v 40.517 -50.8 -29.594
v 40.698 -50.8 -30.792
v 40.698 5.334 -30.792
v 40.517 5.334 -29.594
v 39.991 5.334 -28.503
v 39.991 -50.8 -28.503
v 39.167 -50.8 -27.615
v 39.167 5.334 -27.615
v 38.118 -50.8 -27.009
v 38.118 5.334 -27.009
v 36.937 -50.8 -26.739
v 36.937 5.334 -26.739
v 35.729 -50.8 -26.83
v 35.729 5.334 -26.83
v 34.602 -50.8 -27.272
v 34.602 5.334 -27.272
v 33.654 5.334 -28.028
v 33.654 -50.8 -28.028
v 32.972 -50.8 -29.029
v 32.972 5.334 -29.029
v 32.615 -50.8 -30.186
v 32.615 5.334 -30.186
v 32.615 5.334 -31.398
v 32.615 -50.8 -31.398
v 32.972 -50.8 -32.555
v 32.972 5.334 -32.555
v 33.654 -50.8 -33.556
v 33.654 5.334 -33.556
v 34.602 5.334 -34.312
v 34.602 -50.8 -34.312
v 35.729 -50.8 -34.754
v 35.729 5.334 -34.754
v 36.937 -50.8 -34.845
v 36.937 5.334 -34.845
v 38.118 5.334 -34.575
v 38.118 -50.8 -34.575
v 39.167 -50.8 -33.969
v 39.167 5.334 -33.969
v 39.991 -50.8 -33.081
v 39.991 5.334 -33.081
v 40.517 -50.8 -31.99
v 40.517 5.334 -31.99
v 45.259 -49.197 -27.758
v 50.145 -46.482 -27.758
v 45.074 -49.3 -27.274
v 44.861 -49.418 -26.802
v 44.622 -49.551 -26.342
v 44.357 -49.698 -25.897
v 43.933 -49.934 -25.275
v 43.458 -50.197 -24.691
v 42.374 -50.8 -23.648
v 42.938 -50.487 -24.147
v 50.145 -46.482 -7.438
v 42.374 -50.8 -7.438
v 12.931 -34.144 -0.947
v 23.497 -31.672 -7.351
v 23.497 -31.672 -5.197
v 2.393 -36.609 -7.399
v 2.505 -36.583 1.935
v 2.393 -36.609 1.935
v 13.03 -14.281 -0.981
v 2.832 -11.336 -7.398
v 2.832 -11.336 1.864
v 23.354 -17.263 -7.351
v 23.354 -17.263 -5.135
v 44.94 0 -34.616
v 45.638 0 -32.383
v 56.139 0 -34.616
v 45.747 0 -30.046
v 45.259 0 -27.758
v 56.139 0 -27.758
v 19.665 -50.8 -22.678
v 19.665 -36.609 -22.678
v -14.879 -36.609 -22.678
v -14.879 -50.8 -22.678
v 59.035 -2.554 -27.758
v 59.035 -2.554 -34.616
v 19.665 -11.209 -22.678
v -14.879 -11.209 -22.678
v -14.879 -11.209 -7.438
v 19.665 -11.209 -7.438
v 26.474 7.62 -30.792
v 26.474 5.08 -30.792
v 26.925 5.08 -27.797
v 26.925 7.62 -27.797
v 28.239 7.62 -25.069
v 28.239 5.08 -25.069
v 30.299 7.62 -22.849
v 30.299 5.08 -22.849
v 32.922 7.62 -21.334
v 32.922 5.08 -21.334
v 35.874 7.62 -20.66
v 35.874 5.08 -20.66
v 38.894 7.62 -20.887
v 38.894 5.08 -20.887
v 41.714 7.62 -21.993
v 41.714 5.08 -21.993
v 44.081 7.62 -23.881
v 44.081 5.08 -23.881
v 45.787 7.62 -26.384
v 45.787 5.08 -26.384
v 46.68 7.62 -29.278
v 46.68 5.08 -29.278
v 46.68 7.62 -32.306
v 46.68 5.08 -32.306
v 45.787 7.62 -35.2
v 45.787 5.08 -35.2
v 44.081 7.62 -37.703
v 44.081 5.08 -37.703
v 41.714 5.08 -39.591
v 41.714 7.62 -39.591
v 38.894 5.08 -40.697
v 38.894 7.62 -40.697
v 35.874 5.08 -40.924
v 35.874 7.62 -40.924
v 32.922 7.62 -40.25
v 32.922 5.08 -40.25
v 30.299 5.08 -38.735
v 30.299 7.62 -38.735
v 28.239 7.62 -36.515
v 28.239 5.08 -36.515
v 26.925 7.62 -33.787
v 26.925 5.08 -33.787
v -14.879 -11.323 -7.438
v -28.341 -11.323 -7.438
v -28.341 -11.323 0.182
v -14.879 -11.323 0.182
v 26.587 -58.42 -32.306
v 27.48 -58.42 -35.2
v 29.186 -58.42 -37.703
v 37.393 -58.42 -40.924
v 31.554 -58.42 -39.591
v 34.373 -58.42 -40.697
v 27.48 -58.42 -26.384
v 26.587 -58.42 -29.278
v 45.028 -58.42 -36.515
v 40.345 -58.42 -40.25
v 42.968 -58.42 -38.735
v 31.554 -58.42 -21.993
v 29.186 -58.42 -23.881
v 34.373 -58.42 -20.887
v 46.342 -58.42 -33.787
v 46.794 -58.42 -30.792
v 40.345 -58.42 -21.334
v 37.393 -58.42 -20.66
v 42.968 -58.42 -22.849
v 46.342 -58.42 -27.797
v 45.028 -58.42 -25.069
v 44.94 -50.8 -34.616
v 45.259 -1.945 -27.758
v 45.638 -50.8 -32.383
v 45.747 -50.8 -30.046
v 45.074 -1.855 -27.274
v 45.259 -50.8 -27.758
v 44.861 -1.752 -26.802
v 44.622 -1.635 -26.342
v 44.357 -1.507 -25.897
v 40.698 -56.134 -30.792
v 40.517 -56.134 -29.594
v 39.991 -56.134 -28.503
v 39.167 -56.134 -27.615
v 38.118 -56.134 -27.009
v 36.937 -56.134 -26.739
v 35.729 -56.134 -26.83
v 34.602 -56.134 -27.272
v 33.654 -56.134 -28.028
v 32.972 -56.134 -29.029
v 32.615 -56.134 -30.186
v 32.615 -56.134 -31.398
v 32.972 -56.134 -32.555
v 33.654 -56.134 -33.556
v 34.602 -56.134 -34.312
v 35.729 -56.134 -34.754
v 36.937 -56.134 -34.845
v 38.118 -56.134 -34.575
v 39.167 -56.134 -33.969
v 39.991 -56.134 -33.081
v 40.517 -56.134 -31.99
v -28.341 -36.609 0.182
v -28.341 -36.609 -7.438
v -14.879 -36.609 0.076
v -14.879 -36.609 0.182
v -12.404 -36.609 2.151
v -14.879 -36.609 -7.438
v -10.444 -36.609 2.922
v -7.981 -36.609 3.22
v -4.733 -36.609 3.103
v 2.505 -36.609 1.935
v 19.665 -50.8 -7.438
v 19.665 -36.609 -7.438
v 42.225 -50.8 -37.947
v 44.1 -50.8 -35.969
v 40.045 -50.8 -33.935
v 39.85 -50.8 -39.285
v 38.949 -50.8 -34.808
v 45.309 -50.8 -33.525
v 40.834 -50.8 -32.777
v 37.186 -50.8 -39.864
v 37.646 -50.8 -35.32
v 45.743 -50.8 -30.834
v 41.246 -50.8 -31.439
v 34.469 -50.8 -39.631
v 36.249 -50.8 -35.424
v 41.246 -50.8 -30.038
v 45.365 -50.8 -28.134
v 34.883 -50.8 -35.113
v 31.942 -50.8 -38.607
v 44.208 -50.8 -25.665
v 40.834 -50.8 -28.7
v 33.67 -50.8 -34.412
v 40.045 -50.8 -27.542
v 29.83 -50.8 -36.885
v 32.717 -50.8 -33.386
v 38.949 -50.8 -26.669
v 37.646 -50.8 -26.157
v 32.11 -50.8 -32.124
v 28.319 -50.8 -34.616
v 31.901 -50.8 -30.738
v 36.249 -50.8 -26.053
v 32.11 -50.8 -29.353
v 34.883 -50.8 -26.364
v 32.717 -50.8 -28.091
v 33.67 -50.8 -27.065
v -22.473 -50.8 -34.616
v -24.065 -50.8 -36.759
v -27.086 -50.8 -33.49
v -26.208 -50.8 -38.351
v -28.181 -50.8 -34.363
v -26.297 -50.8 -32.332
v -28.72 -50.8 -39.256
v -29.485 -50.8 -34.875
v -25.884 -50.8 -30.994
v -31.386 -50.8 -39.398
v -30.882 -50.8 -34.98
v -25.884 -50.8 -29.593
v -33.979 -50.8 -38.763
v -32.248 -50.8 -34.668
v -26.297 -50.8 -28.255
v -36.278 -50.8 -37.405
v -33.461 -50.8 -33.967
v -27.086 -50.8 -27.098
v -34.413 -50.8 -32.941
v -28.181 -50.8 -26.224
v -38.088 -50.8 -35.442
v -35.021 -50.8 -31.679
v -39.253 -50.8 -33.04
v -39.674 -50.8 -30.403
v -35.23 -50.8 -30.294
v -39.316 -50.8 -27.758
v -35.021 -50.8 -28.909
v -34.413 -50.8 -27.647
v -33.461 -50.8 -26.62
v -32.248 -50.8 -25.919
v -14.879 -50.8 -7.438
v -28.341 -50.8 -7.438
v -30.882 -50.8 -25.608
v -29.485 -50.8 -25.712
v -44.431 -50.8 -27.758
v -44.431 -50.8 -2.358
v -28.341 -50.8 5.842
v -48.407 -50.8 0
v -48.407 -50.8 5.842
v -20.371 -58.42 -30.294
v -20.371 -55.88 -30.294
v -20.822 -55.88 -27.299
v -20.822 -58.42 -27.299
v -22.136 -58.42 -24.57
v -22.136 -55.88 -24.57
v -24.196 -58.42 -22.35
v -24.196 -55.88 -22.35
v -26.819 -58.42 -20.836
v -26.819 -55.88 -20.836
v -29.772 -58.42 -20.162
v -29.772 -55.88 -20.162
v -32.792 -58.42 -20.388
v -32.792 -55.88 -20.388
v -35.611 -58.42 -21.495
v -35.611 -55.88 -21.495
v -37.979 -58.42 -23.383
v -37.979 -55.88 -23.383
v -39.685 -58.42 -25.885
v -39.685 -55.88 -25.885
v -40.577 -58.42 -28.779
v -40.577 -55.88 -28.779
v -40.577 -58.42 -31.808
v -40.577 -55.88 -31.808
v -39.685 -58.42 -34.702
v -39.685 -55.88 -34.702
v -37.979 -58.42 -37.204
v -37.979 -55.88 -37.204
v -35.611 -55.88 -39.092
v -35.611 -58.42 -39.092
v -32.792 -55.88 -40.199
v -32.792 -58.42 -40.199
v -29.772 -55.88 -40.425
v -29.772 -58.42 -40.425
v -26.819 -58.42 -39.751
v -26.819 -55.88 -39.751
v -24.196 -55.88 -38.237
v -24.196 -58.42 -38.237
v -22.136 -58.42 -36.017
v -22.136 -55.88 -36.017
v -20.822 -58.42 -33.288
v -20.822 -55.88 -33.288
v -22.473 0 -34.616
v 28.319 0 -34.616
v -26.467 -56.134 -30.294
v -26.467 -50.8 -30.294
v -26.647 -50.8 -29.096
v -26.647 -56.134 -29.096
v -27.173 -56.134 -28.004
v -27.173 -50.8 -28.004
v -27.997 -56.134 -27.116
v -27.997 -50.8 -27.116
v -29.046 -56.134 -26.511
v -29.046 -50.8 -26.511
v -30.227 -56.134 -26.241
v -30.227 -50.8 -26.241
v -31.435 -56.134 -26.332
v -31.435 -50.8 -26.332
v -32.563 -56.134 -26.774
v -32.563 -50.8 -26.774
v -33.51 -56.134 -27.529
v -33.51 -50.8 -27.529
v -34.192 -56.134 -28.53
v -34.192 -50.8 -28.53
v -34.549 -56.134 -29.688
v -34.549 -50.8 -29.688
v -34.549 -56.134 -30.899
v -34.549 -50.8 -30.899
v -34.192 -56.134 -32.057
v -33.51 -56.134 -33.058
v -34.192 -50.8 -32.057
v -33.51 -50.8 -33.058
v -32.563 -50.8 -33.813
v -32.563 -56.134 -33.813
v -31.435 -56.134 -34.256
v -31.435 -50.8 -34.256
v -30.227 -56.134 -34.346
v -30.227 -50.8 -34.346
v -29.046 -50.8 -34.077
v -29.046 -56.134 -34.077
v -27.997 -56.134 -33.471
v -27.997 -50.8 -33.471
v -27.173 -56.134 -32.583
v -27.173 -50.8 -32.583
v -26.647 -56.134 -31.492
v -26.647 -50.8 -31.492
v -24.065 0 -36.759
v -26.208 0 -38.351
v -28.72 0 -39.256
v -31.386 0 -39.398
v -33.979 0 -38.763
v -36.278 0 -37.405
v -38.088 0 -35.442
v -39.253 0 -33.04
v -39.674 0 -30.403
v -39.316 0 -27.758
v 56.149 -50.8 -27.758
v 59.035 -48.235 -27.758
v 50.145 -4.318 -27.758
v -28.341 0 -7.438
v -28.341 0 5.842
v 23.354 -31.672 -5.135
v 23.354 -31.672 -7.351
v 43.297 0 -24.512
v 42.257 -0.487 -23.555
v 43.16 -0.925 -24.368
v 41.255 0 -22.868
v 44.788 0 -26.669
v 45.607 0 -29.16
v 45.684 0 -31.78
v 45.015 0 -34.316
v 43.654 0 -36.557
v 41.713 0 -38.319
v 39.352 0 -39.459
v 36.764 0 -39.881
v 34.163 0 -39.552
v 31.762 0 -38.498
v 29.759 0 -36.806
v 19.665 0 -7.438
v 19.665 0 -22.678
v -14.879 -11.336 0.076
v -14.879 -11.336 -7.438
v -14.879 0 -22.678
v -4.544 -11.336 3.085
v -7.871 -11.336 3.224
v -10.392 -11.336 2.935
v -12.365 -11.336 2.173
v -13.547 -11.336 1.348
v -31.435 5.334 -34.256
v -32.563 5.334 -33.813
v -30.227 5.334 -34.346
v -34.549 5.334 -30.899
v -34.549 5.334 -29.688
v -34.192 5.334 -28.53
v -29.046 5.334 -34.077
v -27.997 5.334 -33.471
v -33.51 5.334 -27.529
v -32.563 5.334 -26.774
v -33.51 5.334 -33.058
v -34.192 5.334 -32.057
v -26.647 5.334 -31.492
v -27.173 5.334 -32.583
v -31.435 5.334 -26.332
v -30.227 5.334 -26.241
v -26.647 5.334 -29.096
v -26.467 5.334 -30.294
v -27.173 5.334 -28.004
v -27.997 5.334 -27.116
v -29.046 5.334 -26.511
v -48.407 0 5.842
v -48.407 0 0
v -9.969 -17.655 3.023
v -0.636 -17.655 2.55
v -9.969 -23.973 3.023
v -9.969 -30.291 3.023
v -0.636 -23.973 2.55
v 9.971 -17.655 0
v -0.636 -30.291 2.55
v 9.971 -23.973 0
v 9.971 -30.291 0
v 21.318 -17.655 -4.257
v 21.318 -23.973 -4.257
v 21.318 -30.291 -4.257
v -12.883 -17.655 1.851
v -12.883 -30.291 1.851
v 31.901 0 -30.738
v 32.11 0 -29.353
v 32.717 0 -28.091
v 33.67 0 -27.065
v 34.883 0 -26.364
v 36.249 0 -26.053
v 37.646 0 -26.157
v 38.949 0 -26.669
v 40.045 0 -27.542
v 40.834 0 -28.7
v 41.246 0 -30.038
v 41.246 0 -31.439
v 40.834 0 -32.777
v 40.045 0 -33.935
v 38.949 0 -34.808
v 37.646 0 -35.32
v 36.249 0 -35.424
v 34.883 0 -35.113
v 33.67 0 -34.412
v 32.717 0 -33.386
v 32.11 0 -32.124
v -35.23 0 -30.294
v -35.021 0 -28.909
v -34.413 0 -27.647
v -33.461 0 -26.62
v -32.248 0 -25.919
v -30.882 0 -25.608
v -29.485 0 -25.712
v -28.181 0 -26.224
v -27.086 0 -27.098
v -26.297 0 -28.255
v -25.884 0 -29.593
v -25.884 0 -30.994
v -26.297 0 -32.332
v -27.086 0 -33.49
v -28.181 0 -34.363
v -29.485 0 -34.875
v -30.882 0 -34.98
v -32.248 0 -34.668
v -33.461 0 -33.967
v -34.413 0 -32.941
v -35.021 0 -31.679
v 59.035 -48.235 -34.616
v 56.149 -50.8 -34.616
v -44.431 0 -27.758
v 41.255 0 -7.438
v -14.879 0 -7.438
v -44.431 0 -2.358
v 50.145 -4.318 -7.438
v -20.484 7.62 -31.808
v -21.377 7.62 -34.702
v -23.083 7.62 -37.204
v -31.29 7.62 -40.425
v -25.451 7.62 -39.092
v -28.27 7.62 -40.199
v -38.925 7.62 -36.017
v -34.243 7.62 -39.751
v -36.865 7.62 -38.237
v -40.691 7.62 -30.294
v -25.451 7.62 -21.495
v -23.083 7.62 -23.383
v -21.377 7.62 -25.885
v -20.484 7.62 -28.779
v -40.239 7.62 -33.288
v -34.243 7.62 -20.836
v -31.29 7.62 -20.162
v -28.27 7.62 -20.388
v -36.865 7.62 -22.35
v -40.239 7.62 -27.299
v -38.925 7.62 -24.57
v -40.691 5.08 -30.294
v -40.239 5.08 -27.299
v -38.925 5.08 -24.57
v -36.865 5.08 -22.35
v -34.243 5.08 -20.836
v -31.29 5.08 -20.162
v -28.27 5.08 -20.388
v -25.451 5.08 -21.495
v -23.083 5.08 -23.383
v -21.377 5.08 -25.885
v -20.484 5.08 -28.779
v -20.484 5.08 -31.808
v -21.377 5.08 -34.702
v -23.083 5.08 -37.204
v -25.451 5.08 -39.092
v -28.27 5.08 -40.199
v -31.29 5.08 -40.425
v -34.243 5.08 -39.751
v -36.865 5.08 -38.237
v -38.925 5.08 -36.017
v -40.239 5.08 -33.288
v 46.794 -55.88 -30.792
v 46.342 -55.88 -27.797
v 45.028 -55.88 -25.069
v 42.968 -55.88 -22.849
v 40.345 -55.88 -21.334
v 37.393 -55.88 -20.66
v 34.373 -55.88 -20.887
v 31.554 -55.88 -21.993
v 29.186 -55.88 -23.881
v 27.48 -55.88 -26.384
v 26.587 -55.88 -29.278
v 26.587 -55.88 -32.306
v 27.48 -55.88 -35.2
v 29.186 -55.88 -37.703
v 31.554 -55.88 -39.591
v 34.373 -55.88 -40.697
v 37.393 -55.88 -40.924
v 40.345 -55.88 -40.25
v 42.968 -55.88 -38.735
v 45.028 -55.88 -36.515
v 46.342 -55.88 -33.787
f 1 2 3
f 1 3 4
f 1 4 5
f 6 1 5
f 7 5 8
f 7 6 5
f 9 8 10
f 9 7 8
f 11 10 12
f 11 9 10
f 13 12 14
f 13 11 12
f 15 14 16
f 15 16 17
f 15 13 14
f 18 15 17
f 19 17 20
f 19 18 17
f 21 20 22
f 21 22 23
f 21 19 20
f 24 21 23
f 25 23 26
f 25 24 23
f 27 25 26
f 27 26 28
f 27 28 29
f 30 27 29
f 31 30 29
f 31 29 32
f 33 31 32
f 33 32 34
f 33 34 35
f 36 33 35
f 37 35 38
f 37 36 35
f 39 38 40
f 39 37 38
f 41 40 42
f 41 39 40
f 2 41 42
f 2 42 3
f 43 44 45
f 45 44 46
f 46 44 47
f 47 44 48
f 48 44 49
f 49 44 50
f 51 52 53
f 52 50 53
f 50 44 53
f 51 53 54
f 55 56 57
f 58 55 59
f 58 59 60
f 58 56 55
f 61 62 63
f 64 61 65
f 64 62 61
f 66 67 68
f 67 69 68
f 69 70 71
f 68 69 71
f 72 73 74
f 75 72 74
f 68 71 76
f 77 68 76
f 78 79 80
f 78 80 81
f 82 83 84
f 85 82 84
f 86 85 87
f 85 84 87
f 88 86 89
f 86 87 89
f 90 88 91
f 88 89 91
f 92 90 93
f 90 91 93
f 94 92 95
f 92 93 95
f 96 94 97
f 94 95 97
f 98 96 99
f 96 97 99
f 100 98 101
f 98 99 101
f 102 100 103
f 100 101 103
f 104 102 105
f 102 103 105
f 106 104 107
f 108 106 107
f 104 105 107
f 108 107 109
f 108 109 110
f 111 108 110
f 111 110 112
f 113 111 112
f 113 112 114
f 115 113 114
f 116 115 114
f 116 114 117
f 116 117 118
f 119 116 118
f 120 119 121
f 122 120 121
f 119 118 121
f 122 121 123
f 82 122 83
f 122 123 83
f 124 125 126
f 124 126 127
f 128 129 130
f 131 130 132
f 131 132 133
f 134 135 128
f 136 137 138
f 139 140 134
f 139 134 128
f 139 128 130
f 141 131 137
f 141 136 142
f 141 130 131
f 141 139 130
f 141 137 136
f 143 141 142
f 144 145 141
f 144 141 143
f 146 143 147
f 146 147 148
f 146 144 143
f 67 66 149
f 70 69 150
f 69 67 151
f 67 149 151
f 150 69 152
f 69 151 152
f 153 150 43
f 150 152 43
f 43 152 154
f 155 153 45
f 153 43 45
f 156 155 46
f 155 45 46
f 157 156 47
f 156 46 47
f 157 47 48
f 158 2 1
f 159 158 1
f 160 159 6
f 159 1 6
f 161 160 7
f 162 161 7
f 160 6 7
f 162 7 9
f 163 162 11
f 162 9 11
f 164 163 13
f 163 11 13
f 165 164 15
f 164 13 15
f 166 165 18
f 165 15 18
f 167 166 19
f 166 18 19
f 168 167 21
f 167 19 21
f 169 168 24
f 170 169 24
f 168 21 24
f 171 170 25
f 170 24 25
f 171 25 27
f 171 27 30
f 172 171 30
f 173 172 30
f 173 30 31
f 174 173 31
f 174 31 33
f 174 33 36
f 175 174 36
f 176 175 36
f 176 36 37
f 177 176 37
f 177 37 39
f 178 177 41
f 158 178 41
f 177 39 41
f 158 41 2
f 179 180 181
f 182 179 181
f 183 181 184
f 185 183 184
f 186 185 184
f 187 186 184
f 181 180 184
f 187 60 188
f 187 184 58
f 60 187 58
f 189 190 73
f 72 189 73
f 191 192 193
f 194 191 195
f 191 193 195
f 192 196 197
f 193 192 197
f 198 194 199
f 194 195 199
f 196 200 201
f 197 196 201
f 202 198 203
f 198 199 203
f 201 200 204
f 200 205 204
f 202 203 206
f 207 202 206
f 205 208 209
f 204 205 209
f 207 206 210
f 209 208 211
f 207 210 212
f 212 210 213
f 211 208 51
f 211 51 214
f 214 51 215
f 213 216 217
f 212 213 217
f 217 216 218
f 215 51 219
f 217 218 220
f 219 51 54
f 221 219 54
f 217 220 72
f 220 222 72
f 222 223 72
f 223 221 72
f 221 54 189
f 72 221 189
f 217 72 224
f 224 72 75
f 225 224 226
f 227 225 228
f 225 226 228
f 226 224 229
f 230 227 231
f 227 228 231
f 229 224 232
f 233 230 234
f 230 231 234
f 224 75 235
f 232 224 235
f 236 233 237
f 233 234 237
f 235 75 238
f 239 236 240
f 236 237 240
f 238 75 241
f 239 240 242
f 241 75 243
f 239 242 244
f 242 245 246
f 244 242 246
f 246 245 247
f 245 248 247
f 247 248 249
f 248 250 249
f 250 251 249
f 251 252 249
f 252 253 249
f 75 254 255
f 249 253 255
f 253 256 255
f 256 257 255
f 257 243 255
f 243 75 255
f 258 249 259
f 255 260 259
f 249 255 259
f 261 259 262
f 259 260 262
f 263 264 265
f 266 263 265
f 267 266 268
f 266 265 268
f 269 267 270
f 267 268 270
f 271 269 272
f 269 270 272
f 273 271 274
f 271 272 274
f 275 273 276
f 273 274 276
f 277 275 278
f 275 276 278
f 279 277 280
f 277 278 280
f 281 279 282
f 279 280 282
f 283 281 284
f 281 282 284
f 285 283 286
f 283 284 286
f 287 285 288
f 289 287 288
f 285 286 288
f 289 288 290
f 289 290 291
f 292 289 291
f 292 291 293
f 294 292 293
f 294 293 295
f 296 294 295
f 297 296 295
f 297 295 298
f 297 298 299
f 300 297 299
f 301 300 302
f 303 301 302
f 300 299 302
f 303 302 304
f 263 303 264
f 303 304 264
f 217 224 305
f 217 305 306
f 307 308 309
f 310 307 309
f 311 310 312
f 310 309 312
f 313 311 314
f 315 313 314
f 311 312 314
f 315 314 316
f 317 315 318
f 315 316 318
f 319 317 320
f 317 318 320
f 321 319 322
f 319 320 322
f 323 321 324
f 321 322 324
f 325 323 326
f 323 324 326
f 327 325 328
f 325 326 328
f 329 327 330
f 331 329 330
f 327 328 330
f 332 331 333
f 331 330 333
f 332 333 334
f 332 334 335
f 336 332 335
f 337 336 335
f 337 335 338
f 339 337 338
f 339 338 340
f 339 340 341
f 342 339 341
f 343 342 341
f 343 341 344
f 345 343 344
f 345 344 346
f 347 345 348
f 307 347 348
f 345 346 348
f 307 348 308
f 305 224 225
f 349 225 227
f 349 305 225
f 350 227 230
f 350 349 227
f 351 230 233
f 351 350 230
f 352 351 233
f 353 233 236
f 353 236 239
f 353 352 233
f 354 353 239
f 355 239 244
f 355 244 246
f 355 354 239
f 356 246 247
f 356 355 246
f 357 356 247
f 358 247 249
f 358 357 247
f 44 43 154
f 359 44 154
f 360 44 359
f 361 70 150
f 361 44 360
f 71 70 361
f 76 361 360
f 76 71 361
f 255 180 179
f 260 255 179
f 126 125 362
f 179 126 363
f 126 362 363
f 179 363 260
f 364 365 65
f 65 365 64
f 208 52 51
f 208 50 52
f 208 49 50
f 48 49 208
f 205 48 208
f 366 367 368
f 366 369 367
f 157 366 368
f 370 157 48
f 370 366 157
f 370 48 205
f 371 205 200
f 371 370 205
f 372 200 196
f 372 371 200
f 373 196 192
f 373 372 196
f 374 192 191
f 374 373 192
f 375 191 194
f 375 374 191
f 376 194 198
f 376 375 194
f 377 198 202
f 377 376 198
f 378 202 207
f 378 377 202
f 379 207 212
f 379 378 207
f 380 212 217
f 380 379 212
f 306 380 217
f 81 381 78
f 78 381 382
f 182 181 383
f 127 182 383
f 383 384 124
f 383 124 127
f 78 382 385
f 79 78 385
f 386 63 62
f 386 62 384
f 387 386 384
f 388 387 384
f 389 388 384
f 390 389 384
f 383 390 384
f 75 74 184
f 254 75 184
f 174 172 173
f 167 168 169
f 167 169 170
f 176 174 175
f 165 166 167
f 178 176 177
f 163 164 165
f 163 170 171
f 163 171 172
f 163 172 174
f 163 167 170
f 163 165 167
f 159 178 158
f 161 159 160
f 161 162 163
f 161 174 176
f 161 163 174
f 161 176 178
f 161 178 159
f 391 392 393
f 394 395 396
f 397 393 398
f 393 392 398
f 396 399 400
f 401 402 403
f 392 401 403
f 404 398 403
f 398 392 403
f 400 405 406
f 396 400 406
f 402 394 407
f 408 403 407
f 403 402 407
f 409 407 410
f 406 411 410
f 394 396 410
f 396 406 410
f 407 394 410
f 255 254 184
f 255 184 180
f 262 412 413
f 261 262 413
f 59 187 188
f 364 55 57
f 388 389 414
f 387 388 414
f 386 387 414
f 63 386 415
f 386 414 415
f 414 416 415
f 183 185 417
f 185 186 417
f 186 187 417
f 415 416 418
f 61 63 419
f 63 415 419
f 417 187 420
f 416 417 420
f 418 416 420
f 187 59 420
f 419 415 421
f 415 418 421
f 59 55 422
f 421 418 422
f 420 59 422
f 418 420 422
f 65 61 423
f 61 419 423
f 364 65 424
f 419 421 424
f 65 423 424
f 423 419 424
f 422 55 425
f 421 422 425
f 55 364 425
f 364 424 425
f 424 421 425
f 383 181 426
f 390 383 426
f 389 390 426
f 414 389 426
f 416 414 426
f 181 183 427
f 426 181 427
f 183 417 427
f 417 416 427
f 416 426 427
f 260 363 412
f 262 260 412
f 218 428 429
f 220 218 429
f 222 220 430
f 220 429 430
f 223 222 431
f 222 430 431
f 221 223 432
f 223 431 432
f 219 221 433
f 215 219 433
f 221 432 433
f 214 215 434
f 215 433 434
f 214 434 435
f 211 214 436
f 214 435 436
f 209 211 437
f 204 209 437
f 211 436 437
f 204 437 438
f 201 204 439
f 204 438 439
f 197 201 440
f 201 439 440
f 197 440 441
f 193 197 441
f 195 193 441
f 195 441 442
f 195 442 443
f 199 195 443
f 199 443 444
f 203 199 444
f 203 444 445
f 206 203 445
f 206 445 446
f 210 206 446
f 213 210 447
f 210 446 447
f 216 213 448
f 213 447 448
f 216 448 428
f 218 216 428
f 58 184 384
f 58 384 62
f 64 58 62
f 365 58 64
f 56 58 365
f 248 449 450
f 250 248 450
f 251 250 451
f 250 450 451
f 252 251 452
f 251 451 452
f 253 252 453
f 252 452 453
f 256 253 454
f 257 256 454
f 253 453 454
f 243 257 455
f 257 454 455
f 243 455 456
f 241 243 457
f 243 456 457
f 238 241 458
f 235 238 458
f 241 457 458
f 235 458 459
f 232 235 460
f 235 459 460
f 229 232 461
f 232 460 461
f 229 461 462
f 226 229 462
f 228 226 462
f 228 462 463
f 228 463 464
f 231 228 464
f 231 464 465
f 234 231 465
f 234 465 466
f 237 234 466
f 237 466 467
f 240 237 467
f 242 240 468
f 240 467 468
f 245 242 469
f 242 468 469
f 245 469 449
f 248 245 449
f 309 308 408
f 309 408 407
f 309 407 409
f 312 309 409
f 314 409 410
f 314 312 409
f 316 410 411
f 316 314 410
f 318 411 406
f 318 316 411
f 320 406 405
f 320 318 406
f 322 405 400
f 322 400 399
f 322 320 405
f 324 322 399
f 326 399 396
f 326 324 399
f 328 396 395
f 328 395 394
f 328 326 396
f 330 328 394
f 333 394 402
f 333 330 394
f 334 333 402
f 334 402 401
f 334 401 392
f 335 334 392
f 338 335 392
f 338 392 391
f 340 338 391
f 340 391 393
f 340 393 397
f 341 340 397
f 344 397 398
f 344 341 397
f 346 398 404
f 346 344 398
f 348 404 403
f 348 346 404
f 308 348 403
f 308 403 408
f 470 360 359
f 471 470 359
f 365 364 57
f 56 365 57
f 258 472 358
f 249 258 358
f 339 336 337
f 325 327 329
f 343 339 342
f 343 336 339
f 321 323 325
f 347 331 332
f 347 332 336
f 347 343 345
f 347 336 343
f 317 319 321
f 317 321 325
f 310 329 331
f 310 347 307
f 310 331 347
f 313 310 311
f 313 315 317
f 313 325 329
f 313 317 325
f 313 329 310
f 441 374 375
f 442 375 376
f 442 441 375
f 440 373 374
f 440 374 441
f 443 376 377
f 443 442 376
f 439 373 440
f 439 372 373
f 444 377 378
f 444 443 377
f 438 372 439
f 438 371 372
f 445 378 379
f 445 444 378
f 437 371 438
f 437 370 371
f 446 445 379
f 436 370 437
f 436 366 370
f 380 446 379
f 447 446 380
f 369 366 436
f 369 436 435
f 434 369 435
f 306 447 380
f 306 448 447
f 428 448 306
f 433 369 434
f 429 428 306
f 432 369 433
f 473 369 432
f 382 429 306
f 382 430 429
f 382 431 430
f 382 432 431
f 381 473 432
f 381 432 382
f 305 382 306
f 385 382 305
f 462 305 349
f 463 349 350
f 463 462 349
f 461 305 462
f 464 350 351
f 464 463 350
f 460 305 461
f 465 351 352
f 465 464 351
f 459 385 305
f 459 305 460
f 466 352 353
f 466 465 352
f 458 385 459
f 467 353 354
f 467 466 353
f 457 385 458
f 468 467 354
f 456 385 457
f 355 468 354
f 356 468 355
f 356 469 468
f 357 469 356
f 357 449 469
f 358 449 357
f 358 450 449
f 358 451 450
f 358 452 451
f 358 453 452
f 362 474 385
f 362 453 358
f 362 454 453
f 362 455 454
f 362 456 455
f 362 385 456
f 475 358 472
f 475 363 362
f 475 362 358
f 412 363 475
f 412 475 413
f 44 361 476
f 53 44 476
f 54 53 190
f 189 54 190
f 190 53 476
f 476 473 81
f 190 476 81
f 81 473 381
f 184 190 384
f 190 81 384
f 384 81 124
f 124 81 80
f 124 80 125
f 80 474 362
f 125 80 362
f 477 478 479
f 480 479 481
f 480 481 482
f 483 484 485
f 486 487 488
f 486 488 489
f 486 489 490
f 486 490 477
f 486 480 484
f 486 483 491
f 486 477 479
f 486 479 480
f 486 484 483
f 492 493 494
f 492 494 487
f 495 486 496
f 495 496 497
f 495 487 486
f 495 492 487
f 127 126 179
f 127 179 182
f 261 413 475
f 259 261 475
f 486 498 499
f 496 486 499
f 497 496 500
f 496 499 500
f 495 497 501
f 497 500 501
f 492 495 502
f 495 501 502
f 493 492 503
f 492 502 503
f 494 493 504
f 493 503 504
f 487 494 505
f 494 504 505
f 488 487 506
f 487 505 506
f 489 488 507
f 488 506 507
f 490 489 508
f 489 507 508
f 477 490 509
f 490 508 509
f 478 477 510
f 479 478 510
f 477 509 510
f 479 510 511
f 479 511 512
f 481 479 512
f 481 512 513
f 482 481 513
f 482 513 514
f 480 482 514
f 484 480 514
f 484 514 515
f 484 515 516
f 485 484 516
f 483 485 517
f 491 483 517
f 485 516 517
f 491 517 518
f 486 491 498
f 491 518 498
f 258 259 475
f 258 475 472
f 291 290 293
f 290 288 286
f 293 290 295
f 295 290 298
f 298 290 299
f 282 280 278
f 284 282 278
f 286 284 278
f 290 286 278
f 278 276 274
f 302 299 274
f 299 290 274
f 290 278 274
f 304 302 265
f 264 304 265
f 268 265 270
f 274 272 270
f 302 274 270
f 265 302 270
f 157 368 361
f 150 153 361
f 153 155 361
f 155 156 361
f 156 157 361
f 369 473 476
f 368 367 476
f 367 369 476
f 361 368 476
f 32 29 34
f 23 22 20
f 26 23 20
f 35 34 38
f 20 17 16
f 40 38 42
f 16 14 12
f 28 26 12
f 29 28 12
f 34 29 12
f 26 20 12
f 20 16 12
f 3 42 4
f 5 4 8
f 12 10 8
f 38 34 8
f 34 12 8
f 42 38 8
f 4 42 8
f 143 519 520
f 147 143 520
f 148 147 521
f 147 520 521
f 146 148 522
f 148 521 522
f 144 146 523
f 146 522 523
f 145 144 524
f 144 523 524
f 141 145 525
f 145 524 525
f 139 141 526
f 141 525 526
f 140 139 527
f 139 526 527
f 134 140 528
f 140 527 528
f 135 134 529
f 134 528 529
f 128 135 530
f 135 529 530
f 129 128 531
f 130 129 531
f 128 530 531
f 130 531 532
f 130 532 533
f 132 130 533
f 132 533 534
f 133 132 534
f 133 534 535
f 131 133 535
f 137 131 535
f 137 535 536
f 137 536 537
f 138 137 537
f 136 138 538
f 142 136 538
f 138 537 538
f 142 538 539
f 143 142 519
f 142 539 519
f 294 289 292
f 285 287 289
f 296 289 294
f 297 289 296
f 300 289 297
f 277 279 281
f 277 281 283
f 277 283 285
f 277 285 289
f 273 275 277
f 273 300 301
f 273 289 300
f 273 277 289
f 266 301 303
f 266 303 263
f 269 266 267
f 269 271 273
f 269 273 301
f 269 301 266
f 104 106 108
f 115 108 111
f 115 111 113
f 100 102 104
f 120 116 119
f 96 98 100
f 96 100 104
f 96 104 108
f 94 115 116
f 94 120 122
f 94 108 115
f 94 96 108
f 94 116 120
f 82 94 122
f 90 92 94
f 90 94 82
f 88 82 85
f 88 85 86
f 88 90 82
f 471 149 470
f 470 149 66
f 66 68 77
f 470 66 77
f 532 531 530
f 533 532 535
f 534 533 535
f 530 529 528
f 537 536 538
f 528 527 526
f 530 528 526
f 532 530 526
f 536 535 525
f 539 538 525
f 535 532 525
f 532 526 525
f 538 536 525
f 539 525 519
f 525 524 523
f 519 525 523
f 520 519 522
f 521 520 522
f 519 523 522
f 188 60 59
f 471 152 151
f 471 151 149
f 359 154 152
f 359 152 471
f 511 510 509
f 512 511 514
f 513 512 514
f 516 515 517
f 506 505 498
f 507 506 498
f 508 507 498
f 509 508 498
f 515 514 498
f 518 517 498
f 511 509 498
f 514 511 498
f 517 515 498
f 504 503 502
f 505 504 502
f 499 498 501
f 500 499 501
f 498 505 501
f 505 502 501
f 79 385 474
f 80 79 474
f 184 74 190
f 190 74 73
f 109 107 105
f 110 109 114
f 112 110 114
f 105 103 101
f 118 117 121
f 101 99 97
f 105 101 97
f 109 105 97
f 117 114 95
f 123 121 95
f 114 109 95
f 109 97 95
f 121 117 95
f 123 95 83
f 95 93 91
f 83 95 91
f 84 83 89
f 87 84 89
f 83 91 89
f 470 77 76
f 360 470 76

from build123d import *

# Parameters (mm, degrees)
F1_DEPTH      = 50.8
F2_R          = 9.144
F3_DEPTH      = 54.864
F4_R          = 4.064
F5_DEPTH      = 56.134
F5_DEPTH_BACK = 5.334
F7_START      = 5.08
F6_R          = 10.16
F7_DEPTH      = 2.54
F9_START      = 5.08
F8_R          = 10.16
F9_DEPTH      = 2.54
F10_W         = 34.544
F10_H         = 25.4
F11_DEPTH     = 15.24
F12_W         = 13.462
F12_H         = 25.2863662317
F13_DEPTH     = 7.62
F15_DEPTH     = 25.273
F17_DEPTH     = 9.3726
F19_DEPTH     = 20.32
F20_R         = 9.144
F20_R_2       = 4.699
F21_DEPTH     = 50.8
F22_W         = 6.9764815271
F22_H         = 14.4462492317
F23_DEPTH     = 11.176
F25_DEPTH     = 25.4


with BuildPart() as f1:
    # F0 (on Front) → F1 (new body)
    with BuildSketch(Plane.XZ):
        with BuildLine():
            ThreePointArc((-39.3160984872, -27.7575049432), (-33.9790579937, -38.7625558195), (-22.4726634651, -34.6155049432))
            ThreePointArc((-22.4726634651, -34.6155049432), (-21.6624499567, -32.5217293492), (-21.3868406955, -30.2936400999))
            ThreePointArc((-21.3868406955, -30.2936400999), (-29.2501497194, -21.2397698433), (-39.3160984872, -27.7575049432))
        make_face()
        with BuildLine():
            ThreePointArc((-21.3868406955, -30.2936400999), (-21.6624499567, -32.5217293492), (-22.4726634651, -34.6155049432))
            Line((-22.4726634651, -34.6155049432), (28.3273365349, -34.6155049432))
            ThreePointArc((28.3273365349, -34.6155049432), (34.6764494687, -21.8598808978), (45.7775638516, -30.7919825146))
            ThreePointArc((45.7775638516, -30.7919825146), (45.5656654684, -32.7490968975), (44.9397911684, -34.6155049432))
            Line((44.9397911684, -34.6155049432), (59.0346912427, -34.6155049432))
            Line((59.0346912427, -34.6155049432), (59.0346912427, -27.7575049432))
            Line((59.0346912427, -27.7575049432), (50.1446912427, -27.7575049432))
            Line((50.1446912427, -27.7575049432), (50.1446912427, -7.4375049432))
            Line((50.1446912427, -7.4375049432), (19.6646912427, -7.4375049432))
            Line((19.6646912427, -7.4375049432), (19.6646912427, -22.6775049432))
            Line((19.6646912427, -22.6775049432), (-14.8793087573, -22.6775049432))
            Line((-14.8793087573, -22.6775049432), (-14.8793087573, -7.4375049432))
            Line((-14.8793087573, -7.4375049432), (-28.3413087573, -7.4375049432))
            Line((-28.3413087573, -7.4375049432), (-28.3413087573, 5.842))
            Line((-28.3413087573, 5.842), (-48.4073087573, 5.842))
            Line((-48.4073087573, 5.842), (-48.4073087573, 0))
            Line((-48.4073087573, 0), (-44.4313660264, -2.3575049432))
            Line((-44.4313660264, -2.3575049432), (-44.4313660264, -27.7575049432))
            Line((-44.4313660264, -27.7575049432), (-39.3160984872, -27.7575049432))
            ThreePointArc((-39.3160984872, -27.7575049432), (-29.2501497194, -21.2397698433), (-21.3868406955, -30.2936400999))
        make_face()
        with BuildLine():
            ThreePointArc((45.7775638516, -30.7919825146), (34.6764494687, -21.8598808978), (28.3273365349, -34.6155049432))
            ThreePointArc((28.3273365349, -34.6155049432), (36.6335638516, -39.9359825146), (44.9397911684, -34.6155049432))
            ThreePointArc((44.9397911684, -34.6155049432), (45.5656654684, -32.7490968975), (45.7775638516, -30.7919825146))
        make_face()
    extrude(amount=F1_DEPTH)

    # F2 (on face) → F3 (cut)
    with BuildSketch(Plane.XZ.offset(50.8)):
        with Locations((-30.5308406955, -30.2936400999)):
            Circle(F2_R)
        with Locations((36.6335638516, -30.7919825146)):
            Circle(F2_R)
    extrude(amount=-F3_DEPTH, mode=Mode.SUBTRACT)

    # F10 (on face) → F11 (join)
    with BuildSketch(Plane.XY.offset(-22.6775049432)):
        with Locations((2.3926912427, -23.9094186902)):
            Rectangle(F10_W, F10_H)
    extrude(amount=F11_DEPTH)

    # F12 (on face) → F13 (join)
    with BuildSketch(Plane.XY.offset(-7.4375049432)):
        with Locations((-21.6103087573, -23.9662355743)):
            Rectangle(F12_W, F12_H)
    extrude(amount=F13_DEPTH)

    # F14 (on face) → F15 (join)
    with BuildSketch(Plane.XZ.offset(36.6094186902)):
        with BuildLine():
            add(Edge.make_bspline(
                [(-14.9534931406, 0), (-13.7084147885, 1.280785357), (-10.1476321192, 4.9436860046), (10.580938155, 0.3784500707), (20.8913849344, -4.0742789406), (26.1342285398, -6.3342501821), (28.4668169916, -7.3397317901)],
                knots=[0, 0, 0, 0, 0.183241401, 0.5240495941, 0.7882453676, 1, 1, 1, 1], degree=3))
            Line((-14.9534931406, 0), (-14.8793087573, -7.4375049432))
            Line((-14.8793087573, -7.4375049432), (28.4668169916, -7.3397317901))
        make_face()
    extrude(amount=-F15_DEPTH)

    # F16 (on face) → F17 (cut)
    with BuildSketch(Plane.XY.offset(-7.4375049432)):
        Polygon((2.3926912427, -11.2094186902), (28.6921481749, -18.8049337278), (28.7324799613, -11.1850404643), align=None)
        Polygon((28.6921481749, -38.0666863767), (28.7324799613, -30.4467931132), (2.3926912427, -36.6094186902), align=None)
    extrude(amount=F17_DEPTH, mode=Mode.SUBTRACT)

    # F18 (on face) → F19 (cut)
    with BuildSketch(Plane.XY.offset(-7.4375049432)):
        Polygon((50.1446912427, -4.318), (50.1446912427, 0), (41.2546912427, 0), align=None)
        Polygon((42.373785504, -50.8), (50.1446912427, -50.8), (50.1446912427, -46.482), align=None)
    extrude(amount=-F19_DEPTH, mode=Mode.SUBTRACT)

    # F20 (on face) → F21 (join)
    with BuildSketch(Plane(origin=(0, 0, 0), x_dir=(-1, 0, 0), z_dir=(0, 1, 0))):
        with Locations((30.5308406955, -30.2936400999)):
            Circle(F20_R)
        with Locations((30.5308406955, -30.2936400999)):
            Circle(F20_R_2, mode=Mode.SUBTRACT)
        with Locations((-36.5999266505, -30.7384990156)):
            Circle(F20_R)
        with Locations((-36.5999266505, -30.7384990156)):
            Circle(F20_R_2, mode=Mode.SUBTRACT)
    extrude(amount=-F21_DEPTH)

    # F22 (on face) → F23 (cut)
    with BuildSketch(Plane.XY.offset(-7.4375049432)):
        with Locations((26.8421266228, -24.4486602023)):
            Rectangle(F22_W, F22_H)
    extrude(amount=F23_DEPTH, mode=Mode.SUBTRACT)

    # F24 (on face) → F25 (cut)
    with BuildSketch(Plane.XY.offset(-27.7575049432)):
        Polygon((59.0346912427, 0), (56.1390912427, 0), (59.0346912427, -2.5536791654), align=None)
        Polygon((59.0346912427, -48.2346), (56.1494703707, -50.8), (59.0346912427, -50.8), align=None)
    extrude(amount=-F25_DEPTH, mode=Mode.SUBTRACT)


with BuildPart() as f5:
    # F4 (on face) → F5 (new body, two sides)
    with BuildSketch(Plane.XZ.offset(50.8)) as f5_sk:
        with Locations((36.6335638516, -30.7919825146)):
            Circle(F4_R)
    extrude(amount=-F5_DEPTH)
    extrude(f5_sk.sketch, amount=F5_DEPTH_BACK)


with BuildPart() as f5b:
    # F4 (on face) → F5, piece 2 (new body, two sides)
    with BuildSketch(Plane.XZ.offset(50.8)) as f5_2_sk:
        with Locations((-30.5308406955, -30.2936400999)):
            Circle(F4_R)
    extrude(amount=-F5_DEPTH)
    extrude(f5_2_sk.sketch, amount=F5_DEPTH_BACK)


with BuildPart() as f7:
    # F6 (on face) → F7 (new body)
    with BuildSketch(Plane.XZ.offset(50.8).offset(F7_START)):
        with Locations((-30.5308406955, -30.2936400999)):
            Circle(F6_R)
    extrude(amount=F7_DEPTH)


with BuildPart() as f7b:
    # F6 (on face) → F7, piece 2 (new body)
    with BuildSketch(Plane.XZ.offset(50.8).offset(F7_START)):
        with Locations((36.6335638516, -30.7919825146)):
            Circle(F6_R)
    extrude(amount=F7_DEPTH)


with BuildPart() as f9:
    # F8 (on face) → F9 (new body)
    with BuildSketch(Plane(origin=(0, 0, 0), x_dir=(-1, 0, 0), z_dir=(0, 1, 0)).offset(F9_START)):
        with Locations((-36.6335638516, -30.7919825146)):
            Circle(F8_R)
    extrude(amount=F9_DEPTH)


with BuildPart() as f9b:
    # F8 (on face) → F9, piece 2 (new body)
    with BuildSketch(Plane(origin=(0, 0, 0), x_dir=(-1, 0, 0), z_dir=(0, 1, 0)).offset(F9_START)):
        with Locations((30.5308406955, -30.2936400999)):
            Circle(F8_R)
    extrude(amount=F9_DEPTH)


solid = Compound([f1.part, f5.part, f5b.part, f7.part, f7b.part, f9.part, f9b.part])
